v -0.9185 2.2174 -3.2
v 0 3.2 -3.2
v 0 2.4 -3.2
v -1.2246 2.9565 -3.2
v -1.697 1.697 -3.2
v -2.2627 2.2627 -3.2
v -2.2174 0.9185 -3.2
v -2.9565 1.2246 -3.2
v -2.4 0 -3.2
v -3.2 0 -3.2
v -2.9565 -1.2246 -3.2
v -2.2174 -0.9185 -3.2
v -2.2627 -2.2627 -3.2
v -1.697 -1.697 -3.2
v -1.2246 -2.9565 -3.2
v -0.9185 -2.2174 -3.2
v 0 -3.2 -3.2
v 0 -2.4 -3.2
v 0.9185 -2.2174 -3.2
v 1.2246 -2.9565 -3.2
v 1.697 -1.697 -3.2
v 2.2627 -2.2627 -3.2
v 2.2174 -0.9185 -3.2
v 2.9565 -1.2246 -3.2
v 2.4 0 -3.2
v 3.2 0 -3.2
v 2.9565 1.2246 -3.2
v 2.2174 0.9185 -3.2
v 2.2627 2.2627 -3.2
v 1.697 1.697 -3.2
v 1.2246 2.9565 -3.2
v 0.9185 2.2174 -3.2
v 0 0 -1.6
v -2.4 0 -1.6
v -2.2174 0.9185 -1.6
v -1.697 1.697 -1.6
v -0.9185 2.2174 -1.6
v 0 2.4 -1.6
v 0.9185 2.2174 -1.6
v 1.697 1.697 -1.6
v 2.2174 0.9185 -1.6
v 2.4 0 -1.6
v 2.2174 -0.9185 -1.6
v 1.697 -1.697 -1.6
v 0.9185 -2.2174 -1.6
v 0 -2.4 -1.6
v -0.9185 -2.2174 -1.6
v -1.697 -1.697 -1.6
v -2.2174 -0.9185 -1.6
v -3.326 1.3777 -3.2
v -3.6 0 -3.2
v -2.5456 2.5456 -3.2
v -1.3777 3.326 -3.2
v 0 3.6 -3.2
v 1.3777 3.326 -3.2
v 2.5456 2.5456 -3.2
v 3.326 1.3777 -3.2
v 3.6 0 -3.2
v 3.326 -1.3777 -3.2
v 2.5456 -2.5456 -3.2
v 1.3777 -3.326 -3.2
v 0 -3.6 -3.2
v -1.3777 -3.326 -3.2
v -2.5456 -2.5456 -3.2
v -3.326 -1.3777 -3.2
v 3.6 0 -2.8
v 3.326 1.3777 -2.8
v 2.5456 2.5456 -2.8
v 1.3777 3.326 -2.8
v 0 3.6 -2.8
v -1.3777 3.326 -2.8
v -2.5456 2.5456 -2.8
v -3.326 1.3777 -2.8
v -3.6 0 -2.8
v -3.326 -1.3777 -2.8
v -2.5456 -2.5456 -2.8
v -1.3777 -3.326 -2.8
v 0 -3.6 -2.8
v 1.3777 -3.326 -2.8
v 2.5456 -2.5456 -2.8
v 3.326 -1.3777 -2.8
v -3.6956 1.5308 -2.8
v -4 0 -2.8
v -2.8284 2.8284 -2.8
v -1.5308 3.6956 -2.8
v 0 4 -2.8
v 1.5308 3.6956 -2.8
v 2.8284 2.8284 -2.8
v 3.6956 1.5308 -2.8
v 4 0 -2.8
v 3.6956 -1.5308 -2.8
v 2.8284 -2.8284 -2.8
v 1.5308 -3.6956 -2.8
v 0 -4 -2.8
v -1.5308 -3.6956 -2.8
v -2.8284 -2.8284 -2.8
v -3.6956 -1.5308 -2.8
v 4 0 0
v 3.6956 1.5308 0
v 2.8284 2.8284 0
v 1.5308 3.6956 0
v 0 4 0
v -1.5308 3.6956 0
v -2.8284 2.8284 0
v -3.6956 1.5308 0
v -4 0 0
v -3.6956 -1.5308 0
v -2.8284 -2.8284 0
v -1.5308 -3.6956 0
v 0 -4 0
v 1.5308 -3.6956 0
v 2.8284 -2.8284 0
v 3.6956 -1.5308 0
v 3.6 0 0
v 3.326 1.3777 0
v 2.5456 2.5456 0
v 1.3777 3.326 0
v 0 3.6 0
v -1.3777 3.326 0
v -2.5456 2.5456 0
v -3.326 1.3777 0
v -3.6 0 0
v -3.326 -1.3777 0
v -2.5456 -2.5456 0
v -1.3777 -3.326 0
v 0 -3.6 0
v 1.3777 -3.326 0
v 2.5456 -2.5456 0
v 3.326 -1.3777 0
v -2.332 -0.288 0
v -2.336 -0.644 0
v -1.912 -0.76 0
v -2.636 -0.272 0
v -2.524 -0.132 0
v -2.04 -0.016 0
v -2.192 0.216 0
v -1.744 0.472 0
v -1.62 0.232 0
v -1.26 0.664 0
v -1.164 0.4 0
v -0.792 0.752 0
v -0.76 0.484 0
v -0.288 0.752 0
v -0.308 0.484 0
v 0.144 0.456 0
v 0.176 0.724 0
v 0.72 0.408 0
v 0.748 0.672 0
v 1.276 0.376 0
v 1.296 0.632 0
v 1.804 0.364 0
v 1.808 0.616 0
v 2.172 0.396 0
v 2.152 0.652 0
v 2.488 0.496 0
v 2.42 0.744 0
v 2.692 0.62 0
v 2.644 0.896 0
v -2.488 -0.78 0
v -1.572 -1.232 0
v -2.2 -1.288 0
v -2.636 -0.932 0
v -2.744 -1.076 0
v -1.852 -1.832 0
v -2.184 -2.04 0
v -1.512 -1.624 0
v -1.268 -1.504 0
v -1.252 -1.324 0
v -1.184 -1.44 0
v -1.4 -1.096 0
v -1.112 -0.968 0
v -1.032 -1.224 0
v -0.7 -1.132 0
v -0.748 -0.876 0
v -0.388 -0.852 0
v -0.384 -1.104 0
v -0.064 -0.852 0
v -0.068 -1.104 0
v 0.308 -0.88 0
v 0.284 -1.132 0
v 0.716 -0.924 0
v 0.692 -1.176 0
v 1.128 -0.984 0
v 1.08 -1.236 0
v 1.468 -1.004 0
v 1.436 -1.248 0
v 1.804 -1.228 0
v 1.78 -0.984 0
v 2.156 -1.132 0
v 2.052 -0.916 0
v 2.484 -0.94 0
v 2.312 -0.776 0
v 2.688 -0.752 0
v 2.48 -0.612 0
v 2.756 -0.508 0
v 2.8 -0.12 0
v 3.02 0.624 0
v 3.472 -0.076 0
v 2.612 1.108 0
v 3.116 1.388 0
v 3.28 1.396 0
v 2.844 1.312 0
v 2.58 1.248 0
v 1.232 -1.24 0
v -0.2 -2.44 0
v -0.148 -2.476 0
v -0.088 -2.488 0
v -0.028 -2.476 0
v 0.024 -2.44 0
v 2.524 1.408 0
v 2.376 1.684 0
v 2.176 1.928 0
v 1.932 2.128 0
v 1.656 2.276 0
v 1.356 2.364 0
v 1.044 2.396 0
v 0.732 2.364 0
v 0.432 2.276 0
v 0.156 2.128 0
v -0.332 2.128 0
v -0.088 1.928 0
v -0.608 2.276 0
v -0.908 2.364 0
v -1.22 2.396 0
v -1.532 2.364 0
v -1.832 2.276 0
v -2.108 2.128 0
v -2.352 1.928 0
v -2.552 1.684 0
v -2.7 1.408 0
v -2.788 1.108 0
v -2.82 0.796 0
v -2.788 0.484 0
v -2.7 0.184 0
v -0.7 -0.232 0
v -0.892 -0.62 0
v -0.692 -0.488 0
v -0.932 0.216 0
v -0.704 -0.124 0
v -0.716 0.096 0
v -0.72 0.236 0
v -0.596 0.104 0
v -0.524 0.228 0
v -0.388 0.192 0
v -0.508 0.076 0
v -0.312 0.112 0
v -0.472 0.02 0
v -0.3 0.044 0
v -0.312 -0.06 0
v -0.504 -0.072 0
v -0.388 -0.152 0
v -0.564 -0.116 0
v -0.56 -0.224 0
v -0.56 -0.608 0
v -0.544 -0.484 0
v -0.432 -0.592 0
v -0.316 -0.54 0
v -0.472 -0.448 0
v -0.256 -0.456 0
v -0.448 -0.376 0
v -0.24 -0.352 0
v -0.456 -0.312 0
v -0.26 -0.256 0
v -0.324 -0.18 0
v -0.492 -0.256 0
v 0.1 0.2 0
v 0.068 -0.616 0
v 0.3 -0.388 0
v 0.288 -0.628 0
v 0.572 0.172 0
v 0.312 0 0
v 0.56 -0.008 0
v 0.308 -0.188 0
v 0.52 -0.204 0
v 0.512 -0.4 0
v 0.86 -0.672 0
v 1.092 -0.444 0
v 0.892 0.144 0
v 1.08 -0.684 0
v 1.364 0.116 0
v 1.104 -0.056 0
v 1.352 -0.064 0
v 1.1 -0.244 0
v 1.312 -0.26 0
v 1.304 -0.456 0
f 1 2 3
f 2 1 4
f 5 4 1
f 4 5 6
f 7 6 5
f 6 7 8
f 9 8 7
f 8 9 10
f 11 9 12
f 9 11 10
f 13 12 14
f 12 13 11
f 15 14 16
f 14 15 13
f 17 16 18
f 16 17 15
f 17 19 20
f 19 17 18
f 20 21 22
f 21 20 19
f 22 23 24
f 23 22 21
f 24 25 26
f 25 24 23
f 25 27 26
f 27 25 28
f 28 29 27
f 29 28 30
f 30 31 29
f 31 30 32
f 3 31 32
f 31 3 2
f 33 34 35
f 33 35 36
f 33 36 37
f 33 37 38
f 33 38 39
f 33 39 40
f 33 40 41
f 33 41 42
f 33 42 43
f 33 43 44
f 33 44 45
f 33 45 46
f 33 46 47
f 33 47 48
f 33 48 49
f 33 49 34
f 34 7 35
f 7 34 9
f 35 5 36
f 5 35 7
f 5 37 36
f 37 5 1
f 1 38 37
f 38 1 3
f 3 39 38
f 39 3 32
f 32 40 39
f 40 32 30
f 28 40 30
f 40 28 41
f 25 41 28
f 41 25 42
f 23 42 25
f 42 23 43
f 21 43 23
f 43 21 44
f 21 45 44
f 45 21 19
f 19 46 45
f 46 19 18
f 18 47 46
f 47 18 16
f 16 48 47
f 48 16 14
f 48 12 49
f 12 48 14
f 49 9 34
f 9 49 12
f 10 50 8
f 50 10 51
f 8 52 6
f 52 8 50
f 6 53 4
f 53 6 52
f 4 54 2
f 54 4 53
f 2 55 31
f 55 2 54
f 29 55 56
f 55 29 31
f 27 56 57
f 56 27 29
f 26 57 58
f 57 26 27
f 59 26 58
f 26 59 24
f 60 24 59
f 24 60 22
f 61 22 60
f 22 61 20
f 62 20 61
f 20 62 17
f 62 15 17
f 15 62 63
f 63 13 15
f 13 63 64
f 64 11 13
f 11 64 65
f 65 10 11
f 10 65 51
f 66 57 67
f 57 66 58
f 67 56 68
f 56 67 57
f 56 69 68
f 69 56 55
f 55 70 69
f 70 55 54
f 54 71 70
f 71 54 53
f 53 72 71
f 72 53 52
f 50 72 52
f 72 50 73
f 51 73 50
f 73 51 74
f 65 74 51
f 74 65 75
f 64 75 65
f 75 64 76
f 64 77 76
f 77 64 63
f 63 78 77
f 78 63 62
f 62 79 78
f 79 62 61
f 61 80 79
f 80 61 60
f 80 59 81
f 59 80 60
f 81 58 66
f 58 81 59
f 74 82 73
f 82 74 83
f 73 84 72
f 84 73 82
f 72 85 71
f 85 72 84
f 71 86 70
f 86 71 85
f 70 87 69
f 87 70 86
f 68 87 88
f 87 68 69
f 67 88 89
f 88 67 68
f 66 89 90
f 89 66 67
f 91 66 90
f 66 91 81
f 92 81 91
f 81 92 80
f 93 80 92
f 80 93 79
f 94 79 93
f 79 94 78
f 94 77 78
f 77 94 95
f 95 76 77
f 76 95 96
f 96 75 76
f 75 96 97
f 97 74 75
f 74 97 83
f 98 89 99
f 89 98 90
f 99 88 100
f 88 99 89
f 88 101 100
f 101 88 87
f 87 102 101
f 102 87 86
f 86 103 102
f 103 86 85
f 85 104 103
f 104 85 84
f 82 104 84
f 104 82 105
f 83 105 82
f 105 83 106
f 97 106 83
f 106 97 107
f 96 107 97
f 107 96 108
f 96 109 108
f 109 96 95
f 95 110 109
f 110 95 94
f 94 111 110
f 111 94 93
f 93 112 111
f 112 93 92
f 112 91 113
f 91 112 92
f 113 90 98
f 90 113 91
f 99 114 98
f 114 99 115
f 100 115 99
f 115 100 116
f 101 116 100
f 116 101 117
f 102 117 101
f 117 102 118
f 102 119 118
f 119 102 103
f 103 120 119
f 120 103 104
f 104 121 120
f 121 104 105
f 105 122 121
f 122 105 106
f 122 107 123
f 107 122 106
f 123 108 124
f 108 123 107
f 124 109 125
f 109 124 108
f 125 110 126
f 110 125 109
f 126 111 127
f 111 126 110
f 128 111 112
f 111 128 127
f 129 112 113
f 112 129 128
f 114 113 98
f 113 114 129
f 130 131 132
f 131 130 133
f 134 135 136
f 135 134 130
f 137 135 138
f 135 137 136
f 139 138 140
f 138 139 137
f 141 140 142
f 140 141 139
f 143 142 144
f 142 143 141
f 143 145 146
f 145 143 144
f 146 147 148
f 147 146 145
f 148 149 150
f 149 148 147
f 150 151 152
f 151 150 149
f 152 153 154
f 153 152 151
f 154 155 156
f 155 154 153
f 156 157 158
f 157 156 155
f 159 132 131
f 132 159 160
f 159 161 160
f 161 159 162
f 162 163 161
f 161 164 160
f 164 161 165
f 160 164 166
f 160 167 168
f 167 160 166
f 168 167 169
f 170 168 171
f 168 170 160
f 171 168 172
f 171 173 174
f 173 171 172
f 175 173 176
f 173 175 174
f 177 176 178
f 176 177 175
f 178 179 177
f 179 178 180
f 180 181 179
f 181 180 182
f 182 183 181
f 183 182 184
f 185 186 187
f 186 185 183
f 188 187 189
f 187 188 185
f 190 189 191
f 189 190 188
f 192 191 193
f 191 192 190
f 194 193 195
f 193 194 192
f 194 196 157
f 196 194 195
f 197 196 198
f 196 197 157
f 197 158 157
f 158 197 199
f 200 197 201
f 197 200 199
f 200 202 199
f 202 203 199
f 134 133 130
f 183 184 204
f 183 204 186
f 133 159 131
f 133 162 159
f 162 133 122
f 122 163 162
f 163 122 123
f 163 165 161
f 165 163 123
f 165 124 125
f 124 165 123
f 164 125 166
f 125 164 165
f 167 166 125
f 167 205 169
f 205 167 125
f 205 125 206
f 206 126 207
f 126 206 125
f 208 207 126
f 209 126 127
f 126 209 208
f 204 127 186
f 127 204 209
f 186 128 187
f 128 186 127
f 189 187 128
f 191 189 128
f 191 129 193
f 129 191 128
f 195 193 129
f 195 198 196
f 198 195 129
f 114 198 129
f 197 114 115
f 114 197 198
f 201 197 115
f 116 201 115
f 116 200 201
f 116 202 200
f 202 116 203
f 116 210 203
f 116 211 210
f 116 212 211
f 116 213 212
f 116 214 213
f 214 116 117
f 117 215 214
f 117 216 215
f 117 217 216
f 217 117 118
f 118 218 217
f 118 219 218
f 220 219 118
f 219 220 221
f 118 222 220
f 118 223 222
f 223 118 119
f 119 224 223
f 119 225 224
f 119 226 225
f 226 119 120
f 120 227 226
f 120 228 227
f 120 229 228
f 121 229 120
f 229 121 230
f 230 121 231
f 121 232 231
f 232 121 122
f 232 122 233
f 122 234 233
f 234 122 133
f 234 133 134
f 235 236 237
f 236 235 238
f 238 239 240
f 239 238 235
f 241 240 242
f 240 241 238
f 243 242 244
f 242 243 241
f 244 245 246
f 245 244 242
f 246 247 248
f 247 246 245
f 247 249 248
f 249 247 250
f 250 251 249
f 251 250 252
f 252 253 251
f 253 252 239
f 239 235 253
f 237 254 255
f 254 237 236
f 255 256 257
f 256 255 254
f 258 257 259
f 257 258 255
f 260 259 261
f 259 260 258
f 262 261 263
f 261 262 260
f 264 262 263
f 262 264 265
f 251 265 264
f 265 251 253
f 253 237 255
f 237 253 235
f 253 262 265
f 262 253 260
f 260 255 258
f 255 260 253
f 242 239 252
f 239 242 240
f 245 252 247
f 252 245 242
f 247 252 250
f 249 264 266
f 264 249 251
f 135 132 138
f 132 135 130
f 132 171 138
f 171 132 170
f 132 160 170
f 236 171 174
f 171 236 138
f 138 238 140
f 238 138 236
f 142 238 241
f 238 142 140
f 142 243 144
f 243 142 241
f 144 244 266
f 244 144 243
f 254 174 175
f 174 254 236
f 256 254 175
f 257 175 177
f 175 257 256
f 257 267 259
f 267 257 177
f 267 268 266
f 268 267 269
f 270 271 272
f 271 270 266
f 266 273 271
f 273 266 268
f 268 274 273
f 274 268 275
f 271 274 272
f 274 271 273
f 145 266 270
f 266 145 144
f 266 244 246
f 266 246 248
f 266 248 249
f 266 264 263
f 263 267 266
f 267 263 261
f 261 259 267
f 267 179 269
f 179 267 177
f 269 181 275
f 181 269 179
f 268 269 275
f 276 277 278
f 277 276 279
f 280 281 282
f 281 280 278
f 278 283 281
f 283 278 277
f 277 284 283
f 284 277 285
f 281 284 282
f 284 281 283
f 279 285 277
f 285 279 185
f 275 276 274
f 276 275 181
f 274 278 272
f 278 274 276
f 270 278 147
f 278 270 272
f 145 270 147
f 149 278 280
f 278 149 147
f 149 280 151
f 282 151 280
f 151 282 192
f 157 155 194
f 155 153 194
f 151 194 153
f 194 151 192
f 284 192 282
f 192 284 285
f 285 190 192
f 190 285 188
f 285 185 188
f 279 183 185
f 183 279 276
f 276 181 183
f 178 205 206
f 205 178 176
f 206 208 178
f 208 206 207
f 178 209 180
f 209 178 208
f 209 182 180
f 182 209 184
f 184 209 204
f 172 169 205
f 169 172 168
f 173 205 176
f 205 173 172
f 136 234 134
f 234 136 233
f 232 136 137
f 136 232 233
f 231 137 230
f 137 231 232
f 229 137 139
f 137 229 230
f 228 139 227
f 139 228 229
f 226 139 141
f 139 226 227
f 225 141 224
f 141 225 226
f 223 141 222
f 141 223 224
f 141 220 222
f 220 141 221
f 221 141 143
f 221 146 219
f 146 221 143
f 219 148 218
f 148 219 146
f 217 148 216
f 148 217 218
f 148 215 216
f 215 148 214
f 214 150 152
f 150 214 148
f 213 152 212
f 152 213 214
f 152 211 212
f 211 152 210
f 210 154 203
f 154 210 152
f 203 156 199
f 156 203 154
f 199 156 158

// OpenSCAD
use <../lib.scad>
use <s/98138p1ds01.scad>
use <s/98138p1ds02.scad>
function ldraw_lib__98138p1e() = [
// 0 Tile  1 x  1 Round with Bright Light Orange Heart and Medium Lilac Banner with "BFF" Pattern
// 0 Name: 98138p1e.dat
// 0 Author: Gerald Lasser [GeraldLasser]
// 0 !LDRAW_ORG Part UPDATE 2022-03
// 0 !LICENSE Licensed under CC BY 2.0 and CC BY 4.0 : see CAreadme.txt
// 
// 0 BFC CERTIFY CCW
  [0,"BFC","CERTIFY"],
  [0,"BFC","CCW"],
// 
// 0 !KEYWORDS Best Friends Forever, Bricklink 98138pb148, Dots, Mega Pack
// 0 !KEYWORDS Set 41913
// 
// 0 !HISTORY 2021-06-14 [RainbowDolphin] Subfiled patterns for colour variants
// 0 !HISTORY 2022-05-07 [PTadmin] Official Update 2022-03
// 
// 
// 1 16 0 0 0 1 0 0 0 1 0 0 0 1 s\98138p1ds01.dat
  [1,16,0,0,0,1,0,0,0,1,0,0,0,1, ldraw_lib__s__98138p1ds01()],
// 1 191 0 0 0 1 0 0 0 1 0 0 0 1 s\98138p1ds02.dat
  [1,191,0,0,0,1,0,0,0,1,0,0,0,1, ldraw_lib__s__98138p1ds02()],
];
module ldraw_lib__98138p1e(step=0, col=false, unit=2/5, alt=false, line=0.2, solid=!$preview)
    makepoly(ldraw_lib__98138p1e(), step=step, col=col, unit=unit, alt=alt, line=line, solid=solid);
ldraw_lib__98138p1e(line=0.2);
